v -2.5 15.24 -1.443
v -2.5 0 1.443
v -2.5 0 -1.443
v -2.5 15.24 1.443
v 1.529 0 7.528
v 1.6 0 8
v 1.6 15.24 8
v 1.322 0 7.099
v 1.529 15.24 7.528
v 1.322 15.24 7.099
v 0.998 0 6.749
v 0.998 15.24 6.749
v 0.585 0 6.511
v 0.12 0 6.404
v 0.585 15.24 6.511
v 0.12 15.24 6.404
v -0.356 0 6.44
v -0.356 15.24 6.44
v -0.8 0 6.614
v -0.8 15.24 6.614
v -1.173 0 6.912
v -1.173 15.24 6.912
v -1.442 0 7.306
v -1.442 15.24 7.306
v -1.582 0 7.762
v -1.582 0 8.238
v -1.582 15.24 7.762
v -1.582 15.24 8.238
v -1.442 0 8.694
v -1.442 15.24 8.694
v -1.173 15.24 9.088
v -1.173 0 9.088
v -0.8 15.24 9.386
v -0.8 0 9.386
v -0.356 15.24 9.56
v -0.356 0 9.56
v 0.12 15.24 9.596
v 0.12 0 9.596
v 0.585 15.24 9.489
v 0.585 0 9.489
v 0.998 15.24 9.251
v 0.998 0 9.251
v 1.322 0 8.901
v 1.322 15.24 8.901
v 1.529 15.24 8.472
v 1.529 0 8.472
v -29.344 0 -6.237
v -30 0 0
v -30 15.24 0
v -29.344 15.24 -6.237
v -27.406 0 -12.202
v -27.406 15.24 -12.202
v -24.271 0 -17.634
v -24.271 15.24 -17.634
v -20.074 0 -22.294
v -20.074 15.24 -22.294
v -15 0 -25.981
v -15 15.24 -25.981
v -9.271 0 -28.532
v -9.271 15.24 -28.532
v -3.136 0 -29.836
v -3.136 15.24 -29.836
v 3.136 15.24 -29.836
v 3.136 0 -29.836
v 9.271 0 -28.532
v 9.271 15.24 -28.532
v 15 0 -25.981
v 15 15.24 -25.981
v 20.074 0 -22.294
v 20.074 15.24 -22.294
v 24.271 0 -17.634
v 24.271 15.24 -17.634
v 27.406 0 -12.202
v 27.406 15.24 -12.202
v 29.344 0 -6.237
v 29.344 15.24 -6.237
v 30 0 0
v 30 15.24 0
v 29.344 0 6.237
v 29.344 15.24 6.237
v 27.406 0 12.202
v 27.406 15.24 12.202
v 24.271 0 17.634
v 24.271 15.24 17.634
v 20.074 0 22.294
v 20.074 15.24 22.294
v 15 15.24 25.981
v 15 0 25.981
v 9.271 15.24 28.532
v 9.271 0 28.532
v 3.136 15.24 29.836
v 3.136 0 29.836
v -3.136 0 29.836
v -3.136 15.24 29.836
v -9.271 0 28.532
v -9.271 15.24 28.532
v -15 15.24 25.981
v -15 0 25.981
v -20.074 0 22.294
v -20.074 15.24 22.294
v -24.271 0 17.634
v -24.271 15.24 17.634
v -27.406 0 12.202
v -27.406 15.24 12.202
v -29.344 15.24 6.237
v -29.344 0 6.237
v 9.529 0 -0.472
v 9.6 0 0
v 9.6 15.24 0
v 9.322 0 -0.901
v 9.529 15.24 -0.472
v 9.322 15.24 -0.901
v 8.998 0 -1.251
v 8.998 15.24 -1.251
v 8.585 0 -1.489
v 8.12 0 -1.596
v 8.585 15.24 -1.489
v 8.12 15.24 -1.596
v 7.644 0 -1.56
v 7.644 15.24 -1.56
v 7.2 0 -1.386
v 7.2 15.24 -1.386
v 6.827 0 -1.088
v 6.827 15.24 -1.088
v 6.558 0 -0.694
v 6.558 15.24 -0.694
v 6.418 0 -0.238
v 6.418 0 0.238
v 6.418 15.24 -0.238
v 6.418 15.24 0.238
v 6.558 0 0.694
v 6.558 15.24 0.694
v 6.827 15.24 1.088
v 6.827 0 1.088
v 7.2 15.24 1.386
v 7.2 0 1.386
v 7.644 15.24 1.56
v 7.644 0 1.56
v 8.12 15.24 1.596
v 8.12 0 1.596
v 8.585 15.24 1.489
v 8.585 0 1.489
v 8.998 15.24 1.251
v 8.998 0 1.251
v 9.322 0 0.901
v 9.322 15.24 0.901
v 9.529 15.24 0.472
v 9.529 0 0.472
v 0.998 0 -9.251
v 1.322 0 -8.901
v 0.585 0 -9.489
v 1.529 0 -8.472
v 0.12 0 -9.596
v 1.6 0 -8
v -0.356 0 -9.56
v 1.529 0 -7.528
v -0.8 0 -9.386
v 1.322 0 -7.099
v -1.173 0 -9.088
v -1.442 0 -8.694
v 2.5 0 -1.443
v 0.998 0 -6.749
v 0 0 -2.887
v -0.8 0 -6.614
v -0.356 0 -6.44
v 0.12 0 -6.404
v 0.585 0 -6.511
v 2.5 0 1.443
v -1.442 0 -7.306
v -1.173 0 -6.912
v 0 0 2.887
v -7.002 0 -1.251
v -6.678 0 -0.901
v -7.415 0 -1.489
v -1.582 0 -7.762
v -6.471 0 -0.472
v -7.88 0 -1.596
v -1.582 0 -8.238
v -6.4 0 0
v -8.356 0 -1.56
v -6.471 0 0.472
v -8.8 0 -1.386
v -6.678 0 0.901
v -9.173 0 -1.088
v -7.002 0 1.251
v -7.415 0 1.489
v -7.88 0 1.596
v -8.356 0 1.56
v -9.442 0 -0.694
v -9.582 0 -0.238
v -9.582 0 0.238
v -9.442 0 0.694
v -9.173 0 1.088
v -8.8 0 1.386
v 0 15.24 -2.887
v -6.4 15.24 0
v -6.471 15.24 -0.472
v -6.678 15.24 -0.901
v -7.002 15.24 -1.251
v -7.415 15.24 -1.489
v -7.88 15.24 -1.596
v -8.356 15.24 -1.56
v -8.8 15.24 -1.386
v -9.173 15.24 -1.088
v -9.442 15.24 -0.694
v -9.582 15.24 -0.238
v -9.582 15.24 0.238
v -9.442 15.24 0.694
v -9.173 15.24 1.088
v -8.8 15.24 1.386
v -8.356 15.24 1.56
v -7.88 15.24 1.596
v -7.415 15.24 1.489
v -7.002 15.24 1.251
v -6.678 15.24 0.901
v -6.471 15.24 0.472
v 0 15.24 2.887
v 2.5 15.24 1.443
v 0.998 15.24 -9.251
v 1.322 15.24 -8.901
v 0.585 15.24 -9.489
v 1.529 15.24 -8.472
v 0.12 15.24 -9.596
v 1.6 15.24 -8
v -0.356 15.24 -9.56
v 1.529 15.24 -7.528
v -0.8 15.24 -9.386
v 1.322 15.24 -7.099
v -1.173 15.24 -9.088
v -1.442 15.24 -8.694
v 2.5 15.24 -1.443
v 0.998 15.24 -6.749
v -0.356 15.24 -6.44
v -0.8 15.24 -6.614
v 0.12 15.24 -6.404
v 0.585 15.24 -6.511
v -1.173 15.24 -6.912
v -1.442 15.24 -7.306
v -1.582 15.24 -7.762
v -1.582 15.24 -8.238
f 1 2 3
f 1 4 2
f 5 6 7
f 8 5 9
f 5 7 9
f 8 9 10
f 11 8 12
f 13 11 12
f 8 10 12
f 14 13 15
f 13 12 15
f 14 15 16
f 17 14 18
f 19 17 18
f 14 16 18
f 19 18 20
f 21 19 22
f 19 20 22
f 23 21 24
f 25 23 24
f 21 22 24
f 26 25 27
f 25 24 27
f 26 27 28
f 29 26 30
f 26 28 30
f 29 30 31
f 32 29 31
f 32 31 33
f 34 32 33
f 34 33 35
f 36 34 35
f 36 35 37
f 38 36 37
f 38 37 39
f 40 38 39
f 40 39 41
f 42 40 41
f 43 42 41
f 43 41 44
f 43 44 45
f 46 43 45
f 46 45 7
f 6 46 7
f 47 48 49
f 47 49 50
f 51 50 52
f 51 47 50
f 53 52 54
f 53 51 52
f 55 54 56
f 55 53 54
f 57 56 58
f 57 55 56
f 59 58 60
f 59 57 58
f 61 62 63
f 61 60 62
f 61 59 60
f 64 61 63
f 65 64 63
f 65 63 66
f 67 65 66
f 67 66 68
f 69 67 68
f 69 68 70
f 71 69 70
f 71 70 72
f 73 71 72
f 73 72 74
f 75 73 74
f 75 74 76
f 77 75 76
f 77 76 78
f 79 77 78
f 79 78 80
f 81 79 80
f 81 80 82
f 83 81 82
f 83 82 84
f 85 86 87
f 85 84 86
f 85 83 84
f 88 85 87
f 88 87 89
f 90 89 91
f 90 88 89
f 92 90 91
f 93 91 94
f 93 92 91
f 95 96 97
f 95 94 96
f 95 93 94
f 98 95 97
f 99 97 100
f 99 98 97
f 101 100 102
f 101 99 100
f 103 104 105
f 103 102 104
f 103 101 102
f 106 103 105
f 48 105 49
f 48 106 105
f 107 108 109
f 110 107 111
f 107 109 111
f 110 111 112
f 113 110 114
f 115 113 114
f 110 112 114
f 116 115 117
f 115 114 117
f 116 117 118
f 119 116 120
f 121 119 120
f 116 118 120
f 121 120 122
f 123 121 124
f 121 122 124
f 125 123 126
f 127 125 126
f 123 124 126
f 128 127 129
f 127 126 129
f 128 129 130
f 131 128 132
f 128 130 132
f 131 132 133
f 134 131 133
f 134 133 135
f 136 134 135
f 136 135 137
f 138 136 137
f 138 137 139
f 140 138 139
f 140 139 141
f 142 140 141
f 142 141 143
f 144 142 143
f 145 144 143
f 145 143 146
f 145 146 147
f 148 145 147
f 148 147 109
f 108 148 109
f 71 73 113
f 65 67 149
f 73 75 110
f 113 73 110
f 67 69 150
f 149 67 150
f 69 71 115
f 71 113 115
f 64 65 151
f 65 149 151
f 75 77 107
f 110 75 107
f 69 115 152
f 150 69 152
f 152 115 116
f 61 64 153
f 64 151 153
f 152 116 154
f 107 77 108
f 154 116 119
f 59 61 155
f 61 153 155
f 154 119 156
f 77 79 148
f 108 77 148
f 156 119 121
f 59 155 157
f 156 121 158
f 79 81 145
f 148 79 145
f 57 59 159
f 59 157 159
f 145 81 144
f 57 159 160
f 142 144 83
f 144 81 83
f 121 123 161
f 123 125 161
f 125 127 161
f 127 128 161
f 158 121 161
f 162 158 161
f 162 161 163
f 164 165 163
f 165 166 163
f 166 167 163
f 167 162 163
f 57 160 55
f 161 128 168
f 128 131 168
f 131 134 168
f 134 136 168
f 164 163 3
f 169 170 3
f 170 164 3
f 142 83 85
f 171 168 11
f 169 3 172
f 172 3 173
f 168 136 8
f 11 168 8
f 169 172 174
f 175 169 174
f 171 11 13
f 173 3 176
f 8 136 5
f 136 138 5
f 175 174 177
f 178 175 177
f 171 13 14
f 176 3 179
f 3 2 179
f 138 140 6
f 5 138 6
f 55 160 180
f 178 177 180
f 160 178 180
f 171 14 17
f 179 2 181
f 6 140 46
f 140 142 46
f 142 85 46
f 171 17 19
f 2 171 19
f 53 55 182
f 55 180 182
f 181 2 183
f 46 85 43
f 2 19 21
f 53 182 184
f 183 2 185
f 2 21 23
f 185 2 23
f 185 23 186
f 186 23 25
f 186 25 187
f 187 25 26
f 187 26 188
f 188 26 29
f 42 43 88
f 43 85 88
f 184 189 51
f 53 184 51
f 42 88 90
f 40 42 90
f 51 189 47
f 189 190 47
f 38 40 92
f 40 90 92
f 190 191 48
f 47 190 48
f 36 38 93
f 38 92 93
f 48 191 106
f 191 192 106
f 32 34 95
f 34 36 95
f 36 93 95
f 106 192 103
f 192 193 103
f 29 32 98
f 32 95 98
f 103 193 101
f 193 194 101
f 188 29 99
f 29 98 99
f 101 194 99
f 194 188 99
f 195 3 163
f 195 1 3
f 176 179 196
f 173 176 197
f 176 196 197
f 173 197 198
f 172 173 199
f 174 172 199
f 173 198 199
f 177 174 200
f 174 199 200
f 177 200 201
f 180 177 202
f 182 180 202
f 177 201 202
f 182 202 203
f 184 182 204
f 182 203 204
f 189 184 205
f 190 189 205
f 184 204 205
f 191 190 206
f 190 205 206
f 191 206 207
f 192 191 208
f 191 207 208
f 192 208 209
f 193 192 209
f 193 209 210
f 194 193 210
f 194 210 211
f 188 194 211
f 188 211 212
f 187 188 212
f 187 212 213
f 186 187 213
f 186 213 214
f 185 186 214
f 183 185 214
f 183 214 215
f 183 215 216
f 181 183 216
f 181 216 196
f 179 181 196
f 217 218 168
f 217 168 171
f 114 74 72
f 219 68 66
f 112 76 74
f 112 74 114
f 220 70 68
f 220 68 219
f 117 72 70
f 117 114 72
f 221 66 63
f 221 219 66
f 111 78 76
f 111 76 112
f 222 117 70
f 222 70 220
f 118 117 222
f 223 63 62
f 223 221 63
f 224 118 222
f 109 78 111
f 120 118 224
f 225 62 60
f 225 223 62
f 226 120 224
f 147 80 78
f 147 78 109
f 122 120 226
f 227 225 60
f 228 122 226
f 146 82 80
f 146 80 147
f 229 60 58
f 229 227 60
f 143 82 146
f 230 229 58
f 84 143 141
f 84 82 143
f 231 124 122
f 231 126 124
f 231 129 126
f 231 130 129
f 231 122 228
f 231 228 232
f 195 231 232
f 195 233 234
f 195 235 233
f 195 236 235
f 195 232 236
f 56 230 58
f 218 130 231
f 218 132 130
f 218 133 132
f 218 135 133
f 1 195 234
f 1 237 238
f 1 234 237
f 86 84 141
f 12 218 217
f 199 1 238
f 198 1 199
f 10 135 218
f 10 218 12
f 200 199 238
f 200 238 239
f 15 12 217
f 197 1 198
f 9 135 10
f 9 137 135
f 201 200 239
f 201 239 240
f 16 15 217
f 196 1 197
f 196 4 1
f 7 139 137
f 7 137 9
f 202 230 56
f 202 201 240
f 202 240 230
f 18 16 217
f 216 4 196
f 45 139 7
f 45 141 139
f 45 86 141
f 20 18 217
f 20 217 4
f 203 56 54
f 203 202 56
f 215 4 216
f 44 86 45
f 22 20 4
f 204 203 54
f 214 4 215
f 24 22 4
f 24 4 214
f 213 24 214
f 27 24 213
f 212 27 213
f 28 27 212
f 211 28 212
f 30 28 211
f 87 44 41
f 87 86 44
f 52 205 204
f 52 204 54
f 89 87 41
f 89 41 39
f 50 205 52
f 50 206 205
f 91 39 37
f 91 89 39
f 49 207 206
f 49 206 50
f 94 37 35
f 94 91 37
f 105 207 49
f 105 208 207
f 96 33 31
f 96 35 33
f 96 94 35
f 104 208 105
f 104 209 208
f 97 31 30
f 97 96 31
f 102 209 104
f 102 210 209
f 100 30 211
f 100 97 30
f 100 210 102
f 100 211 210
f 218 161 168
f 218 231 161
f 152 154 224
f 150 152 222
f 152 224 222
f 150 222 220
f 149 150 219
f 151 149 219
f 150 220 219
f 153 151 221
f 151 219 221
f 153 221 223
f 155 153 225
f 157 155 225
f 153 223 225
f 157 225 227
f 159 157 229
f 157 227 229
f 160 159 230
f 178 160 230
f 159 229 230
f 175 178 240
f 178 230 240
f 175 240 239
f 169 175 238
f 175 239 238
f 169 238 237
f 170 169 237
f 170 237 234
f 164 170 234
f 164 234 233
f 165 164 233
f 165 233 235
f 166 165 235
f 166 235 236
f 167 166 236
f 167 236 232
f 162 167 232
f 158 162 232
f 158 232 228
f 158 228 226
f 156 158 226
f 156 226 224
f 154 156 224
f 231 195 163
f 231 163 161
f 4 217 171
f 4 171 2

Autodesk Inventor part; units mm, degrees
ref_plane "YZ Plane" through (0, 0, 0) normal (1, 0, 0) x (0, 1, 0)
ref_plane "XZ Plane" through (0, 0, 0) normal (0, 1, 0) x (-1, 0, 0)
ref_plane "XY Plane" through (0, 0, 0) normal (0, 0, 1) x (1, 0, 0)
sketch "Sketch1" plane through (0, 0, 0) normal (0, 1, 0) x (-1, 0, 0)
  circle A0 centre (0, 0) radius 30
  dimension "d0" = 60
extrude "Extrusion1" add sketch "Sketch1" along normal blind 15.24
sketch "Sketch2" plane through (0, 15.24, 0) normal (0, 1, 0) x (1, 0, 0)
  circle A0 centre (0, 0) radius 8 construction
  circle A1 centre (-8, 0) radius 1.6
  circle A2 centre (0, -8) radius 1.6
  circle A3 centre (8, 0) radius 1.6
  circle A4 centre (0, 8) radius 1.6
  circle A5 centre (0, 0) radius 2.5 construction
  line L0 (-2.5, 1.4434) -> (0, 2.8868)
  line L1 (0, 2.8868) -> (2.5, 1.4434)
  line L2 (2.5, 1.4434) -> (2.5, -1.4434)
  line L3 (2.5, -1.4434) -> (0, -2.8868)
  line L4 (0, -2.8868) -> (-2.5, -1.4434)
  line L5 (-2.5, -1.4434) -> (-2.5, 1.4434)
  point P0 (-2.5, 0)
  dimension "d3" = 16
  dimension "d9" = 5
  dimension "d4" = 3.2
  dimension "d7" = 360
extrude "Extrusion2" cut sketch "Sketch2" against normal through all
properties part number "60mm_ThinWheel"
